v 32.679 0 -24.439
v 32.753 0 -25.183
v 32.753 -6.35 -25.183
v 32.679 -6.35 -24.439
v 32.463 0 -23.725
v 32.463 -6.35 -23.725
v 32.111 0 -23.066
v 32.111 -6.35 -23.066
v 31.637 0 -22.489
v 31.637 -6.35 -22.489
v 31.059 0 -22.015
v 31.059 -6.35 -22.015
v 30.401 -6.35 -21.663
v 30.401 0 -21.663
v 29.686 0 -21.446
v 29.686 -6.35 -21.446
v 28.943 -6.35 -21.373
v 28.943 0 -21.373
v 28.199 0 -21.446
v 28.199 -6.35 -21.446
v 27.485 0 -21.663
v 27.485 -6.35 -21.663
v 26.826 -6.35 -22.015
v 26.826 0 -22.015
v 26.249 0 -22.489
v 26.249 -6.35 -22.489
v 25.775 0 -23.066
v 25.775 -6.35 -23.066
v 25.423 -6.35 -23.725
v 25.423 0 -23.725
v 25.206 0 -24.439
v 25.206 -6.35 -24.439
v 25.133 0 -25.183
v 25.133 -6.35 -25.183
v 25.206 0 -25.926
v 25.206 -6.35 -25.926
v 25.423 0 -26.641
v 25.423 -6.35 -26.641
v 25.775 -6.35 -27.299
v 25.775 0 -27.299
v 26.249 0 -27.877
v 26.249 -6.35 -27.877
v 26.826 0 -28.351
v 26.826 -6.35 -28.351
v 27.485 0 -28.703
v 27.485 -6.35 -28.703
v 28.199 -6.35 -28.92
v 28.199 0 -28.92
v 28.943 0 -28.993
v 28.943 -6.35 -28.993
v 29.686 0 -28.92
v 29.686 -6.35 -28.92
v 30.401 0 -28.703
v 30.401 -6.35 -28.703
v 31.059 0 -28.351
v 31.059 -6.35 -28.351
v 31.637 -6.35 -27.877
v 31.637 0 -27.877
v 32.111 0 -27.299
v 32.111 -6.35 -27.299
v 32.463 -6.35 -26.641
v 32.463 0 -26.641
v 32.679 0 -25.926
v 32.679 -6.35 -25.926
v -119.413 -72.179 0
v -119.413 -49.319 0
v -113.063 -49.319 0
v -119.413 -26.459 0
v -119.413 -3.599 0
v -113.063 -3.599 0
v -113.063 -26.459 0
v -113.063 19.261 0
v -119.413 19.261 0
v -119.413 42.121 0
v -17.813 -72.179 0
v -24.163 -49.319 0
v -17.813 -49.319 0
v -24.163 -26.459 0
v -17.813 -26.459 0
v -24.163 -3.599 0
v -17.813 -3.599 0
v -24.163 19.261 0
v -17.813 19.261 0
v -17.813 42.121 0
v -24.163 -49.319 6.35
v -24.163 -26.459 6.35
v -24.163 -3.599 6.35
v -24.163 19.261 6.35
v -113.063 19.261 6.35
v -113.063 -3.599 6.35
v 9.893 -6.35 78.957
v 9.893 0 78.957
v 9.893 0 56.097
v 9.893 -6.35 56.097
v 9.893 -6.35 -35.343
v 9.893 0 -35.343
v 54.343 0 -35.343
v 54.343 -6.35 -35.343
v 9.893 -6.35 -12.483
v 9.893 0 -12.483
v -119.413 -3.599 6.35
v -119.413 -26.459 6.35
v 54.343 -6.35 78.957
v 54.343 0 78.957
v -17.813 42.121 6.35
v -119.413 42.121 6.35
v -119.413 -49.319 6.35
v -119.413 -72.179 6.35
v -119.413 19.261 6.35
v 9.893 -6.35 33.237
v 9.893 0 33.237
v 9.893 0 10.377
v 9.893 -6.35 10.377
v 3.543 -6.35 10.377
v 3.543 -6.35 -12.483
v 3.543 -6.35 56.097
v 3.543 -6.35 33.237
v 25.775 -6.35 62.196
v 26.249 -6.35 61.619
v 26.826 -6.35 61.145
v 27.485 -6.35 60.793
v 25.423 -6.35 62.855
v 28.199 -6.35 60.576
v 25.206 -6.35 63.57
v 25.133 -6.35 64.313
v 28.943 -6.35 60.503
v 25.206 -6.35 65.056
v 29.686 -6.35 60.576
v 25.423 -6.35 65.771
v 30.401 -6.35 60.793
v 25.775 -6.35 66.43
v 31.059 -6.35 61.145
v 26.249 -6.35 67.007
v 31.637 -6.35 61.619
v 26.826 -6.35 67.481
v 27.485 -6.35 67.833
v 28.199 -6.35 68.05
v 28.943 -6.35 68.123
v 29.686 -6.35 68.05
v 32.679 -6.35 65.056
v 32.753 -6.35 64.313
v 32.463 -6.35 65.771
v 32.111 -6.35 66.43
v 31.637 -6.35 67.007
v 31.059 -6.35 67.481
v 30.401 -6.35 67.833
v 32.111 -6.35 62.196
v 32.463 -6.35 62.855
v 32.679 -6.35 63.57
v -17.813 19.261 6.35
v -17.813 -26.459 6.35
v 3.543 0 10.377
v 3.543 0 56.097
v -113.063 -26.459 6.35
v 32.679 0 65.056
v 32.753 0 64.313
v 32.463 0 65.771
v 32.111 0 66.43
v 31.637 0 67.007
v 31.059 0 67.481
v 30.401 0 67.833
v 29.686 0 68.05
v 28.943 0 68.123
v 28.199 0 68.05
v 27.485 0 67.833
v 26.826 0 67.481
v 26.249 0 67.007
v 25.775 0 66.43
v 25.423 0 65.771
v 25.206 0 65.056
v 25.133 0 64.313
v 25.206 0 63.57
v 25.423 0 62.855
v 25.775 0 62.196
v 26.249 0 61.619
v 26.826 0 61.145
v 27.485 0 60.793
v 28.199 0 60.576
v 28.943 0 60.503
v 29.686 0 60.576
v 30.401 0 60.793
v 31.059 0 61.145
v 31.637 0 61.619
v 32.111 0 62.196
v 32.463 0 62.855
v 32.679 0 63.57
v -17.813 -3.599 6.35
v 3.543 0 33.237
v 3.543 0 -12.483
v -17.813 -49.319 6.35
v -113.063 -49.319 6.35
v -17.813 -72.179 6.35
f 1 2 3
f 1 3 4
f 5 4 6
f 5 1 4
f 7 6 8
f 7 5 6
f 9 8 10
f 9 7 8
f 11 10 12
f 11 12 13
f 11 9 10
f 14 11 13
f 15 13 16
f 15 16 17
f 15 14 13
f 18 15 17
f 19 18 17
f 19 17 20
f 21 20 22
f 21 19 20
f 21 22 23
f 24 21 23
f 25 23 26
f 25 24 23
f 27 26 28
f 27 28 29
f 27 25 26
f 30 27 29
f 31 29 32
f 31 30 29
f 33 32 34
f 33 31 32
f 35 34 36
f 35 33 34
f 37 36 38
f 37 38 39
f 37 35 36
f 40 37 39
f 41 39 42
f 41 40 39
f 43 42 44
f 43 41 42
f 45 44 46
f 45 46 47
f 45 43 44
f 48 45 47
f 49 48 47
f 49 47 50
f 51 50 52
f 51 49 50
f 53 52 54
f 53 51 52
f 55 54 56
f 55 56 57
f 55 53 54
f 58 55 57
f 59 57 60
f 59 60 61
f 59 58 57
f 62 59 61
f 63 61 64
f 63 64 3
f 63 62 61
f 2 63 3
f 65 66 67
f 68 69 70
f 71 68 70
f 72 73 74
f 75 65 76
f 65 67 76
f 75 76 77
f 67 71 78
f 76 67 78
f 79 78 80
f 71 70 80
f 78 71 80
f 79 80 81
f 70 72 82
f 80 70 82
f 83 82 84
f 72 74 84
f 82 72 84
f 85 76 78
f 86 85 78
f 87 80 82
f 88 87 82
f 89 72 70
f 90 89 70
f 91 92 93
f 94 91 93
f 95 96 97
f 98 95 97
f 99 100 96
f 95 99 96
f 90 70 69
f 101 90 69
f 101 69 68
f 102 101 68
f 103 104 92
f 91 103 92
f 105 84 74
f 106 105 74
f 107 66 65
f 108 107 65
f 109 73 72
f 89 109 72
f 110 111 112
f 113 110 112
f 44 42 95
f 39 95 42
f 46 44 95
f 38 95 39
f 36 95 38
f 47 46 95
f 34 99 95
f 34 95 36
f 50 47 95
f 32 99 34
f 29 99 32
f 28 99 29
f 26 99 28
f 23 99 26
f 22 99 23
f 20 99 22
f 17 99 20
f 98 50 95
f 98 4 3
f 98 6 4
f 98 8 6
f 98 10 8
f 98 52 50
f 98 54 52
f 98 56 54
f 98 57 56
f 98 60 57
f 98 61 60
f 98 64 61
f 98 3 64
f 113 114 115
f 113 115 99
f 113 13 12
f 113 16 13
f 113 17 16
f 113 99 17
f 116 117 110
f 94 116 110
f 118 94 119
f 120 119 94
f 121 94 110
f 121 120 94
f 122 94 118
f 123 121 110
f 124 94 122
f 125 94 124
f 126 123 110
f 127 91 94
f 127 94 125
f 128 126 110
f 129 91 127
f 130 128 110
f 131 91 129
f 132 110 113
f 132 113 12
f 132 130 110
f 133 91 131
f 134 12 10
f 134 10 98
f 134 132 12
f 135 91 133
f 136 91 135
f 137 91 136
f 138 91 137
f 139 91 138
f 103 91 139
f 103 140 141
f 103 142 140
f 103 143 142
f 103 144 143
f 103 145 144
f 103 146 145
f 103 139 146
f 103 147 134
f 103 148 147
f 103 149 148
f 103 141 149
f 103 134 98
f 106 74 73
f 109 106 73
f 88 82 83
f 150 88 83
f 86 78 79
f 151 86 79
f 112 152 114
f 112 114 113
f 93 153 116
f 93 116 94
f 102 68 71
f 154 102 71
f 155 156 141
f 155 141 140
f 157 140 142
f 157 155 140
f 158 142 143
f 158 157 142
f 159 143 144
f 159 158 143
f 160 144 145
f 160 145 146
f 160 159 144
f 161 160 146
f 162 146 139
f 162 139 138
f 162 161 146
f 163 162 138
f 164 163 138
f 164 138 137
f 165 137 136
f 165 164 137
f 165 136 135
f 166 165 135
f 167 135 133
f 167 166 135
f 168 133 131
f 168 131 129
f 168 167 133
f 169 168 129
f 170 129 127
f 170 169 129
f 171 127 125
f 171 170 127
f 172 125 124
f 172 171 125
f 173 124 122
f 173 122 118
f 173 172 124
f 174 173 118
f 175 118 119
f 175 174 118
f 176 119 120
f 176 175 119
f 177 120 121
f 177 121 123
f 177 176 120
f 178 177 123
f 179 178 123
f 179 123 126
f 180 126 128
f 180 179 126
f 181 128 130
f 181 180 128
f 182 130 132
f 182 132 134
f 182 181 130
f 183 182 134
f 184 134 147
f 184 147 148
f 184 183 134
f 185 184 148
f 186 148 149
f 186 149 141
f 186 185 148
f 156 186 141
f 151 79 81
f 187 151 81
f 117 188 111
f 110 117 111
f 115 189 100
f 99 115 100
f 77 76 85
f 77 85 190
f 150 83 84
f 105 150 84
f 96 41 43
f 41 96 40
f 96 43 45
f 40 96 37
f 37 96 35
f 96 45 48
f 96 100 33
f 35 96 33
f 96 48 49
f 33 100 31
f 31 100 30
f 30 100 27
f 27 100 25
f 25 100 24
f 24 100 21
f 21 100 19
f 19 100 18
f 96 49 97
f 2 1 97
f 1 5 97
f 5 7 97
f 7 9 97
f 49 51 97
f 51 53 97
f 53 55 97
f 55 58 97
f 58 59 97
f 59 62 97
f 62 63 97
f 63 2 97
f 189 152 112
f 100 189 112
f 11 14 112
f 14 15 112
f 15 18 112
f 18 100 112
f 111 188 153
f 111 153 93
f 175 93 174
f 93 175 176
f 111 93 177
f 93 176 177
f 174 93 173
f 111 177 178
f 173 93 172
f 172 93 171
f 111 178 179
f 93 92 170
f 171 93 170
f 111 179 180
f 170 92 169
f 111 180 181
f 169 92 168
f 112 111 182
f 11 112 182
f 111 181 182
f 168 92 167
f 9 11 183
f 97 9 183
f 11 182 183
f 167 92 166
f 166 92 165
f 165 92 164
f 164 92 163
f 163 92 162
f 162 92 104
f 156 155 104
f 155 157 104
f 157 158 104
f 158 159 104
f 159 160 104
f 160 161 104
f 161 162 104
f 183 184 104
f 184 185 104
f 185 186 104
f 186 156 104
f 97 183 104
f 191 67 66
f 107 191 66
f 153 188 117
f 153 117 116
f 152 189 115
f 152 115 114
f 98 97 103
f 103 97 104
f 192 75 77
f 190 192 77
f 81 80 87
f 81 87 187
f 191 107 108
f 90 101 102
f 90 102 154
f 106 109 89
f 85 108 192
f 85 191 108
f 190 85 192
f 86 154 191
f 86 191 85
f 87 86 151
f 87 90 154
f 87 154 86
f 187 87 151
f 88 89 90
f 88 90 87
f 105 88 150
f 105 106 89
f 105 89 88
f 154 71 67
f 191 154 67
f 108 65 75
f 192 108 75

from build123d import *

# Parameters (mm, degrees)
F0_W     = 6.35
F0_H     = 22.86
F1_DEPTH = 6.35
F2_W     = 6.35
F2_H     = 22.86
F2_R     = 3.81
F3_DEPTH = 6.35


# Not quite as in the source:
# - a length typed as a fraction of an inch, garbled in the dataset ("3 / 203.2 mm" for 3/8 in), is restored


with BuildPart() as f1:
    # F0 (on Top) → F1 (new body)
    with BuildSketch(Plane.XY):
        with Locations((-20.988421008, 30.6906817461)):
            Rectangle(F0_W, F0_H)
        with Locations((-20.988421008, -60.7493182539)):
            Rectangle(F0_W, F0_H)
        Polygon((-24.163421008, 42.1206817461), (-68.613421008, 42.1206817461), (-119.413421008, 42.1206817461), (-119.413421008, 19.2606817461), (-113.063421008, 19.2606817461), (-113.063421008, -3.5993182539), (-119.413421008, -3.5993182539), (-119.413421008, -26.4593182539), (-113.063421008, -26.4593182539), (-113.063421008, -49.3193182539), (-119.413421008, -49.3193182539), (-119.413421008, -72.1793182539), (-68.613421008, -72.1793182539), (-24.163421008, -72.1793182539), (-24.163421008, -49.3193182539), (-24.163421008, -26.4593182539), (-24.163421008, -3.5993182539), (-24.163421008, 19.2606817461), align=None)
        with Locations((-20.988421008, -15.0293182539)):
            Rectangle(F0_W, F0_H)
    extrude(amount=F1_DEPTH)


with BuildPart() as f3:
    # F2 (on Front) → F3 (new body)
    with BuildSketch(Plane.XZ):
        with Locations((6.7176349759, 44.6672367319)):
            Rectangle(F2_W, F2_H)
        with Locations((6.7176349759, -1.0527632681)):
            Rectangle(F2_W, F2_H)
        Polygon((54.3426349759, 78.9572367319), (9.8926349759, 78.9572367319), (9.8926349759, 56.0972367319), (9.8926349759, 33.2372367319), (9.8926349759, 10.3772367319), (9.8926349759, -12.4827632681), (9.8926349759, -35.3427632681), (54.3426349759, -35.3427632681), align=None)
        with Locations((28.9426349759, -25.1827632681)):
            Circle(F2_R, mode=Mode.SUBTRACT)
        with Locations((28.9426349759, 64.3128305674)):
            Circle(F2_R, mode=Mode.SUBTRACT)
    extrude(amount=F3_DEPTH)


solid = Compound([f1.part, f3.part])
